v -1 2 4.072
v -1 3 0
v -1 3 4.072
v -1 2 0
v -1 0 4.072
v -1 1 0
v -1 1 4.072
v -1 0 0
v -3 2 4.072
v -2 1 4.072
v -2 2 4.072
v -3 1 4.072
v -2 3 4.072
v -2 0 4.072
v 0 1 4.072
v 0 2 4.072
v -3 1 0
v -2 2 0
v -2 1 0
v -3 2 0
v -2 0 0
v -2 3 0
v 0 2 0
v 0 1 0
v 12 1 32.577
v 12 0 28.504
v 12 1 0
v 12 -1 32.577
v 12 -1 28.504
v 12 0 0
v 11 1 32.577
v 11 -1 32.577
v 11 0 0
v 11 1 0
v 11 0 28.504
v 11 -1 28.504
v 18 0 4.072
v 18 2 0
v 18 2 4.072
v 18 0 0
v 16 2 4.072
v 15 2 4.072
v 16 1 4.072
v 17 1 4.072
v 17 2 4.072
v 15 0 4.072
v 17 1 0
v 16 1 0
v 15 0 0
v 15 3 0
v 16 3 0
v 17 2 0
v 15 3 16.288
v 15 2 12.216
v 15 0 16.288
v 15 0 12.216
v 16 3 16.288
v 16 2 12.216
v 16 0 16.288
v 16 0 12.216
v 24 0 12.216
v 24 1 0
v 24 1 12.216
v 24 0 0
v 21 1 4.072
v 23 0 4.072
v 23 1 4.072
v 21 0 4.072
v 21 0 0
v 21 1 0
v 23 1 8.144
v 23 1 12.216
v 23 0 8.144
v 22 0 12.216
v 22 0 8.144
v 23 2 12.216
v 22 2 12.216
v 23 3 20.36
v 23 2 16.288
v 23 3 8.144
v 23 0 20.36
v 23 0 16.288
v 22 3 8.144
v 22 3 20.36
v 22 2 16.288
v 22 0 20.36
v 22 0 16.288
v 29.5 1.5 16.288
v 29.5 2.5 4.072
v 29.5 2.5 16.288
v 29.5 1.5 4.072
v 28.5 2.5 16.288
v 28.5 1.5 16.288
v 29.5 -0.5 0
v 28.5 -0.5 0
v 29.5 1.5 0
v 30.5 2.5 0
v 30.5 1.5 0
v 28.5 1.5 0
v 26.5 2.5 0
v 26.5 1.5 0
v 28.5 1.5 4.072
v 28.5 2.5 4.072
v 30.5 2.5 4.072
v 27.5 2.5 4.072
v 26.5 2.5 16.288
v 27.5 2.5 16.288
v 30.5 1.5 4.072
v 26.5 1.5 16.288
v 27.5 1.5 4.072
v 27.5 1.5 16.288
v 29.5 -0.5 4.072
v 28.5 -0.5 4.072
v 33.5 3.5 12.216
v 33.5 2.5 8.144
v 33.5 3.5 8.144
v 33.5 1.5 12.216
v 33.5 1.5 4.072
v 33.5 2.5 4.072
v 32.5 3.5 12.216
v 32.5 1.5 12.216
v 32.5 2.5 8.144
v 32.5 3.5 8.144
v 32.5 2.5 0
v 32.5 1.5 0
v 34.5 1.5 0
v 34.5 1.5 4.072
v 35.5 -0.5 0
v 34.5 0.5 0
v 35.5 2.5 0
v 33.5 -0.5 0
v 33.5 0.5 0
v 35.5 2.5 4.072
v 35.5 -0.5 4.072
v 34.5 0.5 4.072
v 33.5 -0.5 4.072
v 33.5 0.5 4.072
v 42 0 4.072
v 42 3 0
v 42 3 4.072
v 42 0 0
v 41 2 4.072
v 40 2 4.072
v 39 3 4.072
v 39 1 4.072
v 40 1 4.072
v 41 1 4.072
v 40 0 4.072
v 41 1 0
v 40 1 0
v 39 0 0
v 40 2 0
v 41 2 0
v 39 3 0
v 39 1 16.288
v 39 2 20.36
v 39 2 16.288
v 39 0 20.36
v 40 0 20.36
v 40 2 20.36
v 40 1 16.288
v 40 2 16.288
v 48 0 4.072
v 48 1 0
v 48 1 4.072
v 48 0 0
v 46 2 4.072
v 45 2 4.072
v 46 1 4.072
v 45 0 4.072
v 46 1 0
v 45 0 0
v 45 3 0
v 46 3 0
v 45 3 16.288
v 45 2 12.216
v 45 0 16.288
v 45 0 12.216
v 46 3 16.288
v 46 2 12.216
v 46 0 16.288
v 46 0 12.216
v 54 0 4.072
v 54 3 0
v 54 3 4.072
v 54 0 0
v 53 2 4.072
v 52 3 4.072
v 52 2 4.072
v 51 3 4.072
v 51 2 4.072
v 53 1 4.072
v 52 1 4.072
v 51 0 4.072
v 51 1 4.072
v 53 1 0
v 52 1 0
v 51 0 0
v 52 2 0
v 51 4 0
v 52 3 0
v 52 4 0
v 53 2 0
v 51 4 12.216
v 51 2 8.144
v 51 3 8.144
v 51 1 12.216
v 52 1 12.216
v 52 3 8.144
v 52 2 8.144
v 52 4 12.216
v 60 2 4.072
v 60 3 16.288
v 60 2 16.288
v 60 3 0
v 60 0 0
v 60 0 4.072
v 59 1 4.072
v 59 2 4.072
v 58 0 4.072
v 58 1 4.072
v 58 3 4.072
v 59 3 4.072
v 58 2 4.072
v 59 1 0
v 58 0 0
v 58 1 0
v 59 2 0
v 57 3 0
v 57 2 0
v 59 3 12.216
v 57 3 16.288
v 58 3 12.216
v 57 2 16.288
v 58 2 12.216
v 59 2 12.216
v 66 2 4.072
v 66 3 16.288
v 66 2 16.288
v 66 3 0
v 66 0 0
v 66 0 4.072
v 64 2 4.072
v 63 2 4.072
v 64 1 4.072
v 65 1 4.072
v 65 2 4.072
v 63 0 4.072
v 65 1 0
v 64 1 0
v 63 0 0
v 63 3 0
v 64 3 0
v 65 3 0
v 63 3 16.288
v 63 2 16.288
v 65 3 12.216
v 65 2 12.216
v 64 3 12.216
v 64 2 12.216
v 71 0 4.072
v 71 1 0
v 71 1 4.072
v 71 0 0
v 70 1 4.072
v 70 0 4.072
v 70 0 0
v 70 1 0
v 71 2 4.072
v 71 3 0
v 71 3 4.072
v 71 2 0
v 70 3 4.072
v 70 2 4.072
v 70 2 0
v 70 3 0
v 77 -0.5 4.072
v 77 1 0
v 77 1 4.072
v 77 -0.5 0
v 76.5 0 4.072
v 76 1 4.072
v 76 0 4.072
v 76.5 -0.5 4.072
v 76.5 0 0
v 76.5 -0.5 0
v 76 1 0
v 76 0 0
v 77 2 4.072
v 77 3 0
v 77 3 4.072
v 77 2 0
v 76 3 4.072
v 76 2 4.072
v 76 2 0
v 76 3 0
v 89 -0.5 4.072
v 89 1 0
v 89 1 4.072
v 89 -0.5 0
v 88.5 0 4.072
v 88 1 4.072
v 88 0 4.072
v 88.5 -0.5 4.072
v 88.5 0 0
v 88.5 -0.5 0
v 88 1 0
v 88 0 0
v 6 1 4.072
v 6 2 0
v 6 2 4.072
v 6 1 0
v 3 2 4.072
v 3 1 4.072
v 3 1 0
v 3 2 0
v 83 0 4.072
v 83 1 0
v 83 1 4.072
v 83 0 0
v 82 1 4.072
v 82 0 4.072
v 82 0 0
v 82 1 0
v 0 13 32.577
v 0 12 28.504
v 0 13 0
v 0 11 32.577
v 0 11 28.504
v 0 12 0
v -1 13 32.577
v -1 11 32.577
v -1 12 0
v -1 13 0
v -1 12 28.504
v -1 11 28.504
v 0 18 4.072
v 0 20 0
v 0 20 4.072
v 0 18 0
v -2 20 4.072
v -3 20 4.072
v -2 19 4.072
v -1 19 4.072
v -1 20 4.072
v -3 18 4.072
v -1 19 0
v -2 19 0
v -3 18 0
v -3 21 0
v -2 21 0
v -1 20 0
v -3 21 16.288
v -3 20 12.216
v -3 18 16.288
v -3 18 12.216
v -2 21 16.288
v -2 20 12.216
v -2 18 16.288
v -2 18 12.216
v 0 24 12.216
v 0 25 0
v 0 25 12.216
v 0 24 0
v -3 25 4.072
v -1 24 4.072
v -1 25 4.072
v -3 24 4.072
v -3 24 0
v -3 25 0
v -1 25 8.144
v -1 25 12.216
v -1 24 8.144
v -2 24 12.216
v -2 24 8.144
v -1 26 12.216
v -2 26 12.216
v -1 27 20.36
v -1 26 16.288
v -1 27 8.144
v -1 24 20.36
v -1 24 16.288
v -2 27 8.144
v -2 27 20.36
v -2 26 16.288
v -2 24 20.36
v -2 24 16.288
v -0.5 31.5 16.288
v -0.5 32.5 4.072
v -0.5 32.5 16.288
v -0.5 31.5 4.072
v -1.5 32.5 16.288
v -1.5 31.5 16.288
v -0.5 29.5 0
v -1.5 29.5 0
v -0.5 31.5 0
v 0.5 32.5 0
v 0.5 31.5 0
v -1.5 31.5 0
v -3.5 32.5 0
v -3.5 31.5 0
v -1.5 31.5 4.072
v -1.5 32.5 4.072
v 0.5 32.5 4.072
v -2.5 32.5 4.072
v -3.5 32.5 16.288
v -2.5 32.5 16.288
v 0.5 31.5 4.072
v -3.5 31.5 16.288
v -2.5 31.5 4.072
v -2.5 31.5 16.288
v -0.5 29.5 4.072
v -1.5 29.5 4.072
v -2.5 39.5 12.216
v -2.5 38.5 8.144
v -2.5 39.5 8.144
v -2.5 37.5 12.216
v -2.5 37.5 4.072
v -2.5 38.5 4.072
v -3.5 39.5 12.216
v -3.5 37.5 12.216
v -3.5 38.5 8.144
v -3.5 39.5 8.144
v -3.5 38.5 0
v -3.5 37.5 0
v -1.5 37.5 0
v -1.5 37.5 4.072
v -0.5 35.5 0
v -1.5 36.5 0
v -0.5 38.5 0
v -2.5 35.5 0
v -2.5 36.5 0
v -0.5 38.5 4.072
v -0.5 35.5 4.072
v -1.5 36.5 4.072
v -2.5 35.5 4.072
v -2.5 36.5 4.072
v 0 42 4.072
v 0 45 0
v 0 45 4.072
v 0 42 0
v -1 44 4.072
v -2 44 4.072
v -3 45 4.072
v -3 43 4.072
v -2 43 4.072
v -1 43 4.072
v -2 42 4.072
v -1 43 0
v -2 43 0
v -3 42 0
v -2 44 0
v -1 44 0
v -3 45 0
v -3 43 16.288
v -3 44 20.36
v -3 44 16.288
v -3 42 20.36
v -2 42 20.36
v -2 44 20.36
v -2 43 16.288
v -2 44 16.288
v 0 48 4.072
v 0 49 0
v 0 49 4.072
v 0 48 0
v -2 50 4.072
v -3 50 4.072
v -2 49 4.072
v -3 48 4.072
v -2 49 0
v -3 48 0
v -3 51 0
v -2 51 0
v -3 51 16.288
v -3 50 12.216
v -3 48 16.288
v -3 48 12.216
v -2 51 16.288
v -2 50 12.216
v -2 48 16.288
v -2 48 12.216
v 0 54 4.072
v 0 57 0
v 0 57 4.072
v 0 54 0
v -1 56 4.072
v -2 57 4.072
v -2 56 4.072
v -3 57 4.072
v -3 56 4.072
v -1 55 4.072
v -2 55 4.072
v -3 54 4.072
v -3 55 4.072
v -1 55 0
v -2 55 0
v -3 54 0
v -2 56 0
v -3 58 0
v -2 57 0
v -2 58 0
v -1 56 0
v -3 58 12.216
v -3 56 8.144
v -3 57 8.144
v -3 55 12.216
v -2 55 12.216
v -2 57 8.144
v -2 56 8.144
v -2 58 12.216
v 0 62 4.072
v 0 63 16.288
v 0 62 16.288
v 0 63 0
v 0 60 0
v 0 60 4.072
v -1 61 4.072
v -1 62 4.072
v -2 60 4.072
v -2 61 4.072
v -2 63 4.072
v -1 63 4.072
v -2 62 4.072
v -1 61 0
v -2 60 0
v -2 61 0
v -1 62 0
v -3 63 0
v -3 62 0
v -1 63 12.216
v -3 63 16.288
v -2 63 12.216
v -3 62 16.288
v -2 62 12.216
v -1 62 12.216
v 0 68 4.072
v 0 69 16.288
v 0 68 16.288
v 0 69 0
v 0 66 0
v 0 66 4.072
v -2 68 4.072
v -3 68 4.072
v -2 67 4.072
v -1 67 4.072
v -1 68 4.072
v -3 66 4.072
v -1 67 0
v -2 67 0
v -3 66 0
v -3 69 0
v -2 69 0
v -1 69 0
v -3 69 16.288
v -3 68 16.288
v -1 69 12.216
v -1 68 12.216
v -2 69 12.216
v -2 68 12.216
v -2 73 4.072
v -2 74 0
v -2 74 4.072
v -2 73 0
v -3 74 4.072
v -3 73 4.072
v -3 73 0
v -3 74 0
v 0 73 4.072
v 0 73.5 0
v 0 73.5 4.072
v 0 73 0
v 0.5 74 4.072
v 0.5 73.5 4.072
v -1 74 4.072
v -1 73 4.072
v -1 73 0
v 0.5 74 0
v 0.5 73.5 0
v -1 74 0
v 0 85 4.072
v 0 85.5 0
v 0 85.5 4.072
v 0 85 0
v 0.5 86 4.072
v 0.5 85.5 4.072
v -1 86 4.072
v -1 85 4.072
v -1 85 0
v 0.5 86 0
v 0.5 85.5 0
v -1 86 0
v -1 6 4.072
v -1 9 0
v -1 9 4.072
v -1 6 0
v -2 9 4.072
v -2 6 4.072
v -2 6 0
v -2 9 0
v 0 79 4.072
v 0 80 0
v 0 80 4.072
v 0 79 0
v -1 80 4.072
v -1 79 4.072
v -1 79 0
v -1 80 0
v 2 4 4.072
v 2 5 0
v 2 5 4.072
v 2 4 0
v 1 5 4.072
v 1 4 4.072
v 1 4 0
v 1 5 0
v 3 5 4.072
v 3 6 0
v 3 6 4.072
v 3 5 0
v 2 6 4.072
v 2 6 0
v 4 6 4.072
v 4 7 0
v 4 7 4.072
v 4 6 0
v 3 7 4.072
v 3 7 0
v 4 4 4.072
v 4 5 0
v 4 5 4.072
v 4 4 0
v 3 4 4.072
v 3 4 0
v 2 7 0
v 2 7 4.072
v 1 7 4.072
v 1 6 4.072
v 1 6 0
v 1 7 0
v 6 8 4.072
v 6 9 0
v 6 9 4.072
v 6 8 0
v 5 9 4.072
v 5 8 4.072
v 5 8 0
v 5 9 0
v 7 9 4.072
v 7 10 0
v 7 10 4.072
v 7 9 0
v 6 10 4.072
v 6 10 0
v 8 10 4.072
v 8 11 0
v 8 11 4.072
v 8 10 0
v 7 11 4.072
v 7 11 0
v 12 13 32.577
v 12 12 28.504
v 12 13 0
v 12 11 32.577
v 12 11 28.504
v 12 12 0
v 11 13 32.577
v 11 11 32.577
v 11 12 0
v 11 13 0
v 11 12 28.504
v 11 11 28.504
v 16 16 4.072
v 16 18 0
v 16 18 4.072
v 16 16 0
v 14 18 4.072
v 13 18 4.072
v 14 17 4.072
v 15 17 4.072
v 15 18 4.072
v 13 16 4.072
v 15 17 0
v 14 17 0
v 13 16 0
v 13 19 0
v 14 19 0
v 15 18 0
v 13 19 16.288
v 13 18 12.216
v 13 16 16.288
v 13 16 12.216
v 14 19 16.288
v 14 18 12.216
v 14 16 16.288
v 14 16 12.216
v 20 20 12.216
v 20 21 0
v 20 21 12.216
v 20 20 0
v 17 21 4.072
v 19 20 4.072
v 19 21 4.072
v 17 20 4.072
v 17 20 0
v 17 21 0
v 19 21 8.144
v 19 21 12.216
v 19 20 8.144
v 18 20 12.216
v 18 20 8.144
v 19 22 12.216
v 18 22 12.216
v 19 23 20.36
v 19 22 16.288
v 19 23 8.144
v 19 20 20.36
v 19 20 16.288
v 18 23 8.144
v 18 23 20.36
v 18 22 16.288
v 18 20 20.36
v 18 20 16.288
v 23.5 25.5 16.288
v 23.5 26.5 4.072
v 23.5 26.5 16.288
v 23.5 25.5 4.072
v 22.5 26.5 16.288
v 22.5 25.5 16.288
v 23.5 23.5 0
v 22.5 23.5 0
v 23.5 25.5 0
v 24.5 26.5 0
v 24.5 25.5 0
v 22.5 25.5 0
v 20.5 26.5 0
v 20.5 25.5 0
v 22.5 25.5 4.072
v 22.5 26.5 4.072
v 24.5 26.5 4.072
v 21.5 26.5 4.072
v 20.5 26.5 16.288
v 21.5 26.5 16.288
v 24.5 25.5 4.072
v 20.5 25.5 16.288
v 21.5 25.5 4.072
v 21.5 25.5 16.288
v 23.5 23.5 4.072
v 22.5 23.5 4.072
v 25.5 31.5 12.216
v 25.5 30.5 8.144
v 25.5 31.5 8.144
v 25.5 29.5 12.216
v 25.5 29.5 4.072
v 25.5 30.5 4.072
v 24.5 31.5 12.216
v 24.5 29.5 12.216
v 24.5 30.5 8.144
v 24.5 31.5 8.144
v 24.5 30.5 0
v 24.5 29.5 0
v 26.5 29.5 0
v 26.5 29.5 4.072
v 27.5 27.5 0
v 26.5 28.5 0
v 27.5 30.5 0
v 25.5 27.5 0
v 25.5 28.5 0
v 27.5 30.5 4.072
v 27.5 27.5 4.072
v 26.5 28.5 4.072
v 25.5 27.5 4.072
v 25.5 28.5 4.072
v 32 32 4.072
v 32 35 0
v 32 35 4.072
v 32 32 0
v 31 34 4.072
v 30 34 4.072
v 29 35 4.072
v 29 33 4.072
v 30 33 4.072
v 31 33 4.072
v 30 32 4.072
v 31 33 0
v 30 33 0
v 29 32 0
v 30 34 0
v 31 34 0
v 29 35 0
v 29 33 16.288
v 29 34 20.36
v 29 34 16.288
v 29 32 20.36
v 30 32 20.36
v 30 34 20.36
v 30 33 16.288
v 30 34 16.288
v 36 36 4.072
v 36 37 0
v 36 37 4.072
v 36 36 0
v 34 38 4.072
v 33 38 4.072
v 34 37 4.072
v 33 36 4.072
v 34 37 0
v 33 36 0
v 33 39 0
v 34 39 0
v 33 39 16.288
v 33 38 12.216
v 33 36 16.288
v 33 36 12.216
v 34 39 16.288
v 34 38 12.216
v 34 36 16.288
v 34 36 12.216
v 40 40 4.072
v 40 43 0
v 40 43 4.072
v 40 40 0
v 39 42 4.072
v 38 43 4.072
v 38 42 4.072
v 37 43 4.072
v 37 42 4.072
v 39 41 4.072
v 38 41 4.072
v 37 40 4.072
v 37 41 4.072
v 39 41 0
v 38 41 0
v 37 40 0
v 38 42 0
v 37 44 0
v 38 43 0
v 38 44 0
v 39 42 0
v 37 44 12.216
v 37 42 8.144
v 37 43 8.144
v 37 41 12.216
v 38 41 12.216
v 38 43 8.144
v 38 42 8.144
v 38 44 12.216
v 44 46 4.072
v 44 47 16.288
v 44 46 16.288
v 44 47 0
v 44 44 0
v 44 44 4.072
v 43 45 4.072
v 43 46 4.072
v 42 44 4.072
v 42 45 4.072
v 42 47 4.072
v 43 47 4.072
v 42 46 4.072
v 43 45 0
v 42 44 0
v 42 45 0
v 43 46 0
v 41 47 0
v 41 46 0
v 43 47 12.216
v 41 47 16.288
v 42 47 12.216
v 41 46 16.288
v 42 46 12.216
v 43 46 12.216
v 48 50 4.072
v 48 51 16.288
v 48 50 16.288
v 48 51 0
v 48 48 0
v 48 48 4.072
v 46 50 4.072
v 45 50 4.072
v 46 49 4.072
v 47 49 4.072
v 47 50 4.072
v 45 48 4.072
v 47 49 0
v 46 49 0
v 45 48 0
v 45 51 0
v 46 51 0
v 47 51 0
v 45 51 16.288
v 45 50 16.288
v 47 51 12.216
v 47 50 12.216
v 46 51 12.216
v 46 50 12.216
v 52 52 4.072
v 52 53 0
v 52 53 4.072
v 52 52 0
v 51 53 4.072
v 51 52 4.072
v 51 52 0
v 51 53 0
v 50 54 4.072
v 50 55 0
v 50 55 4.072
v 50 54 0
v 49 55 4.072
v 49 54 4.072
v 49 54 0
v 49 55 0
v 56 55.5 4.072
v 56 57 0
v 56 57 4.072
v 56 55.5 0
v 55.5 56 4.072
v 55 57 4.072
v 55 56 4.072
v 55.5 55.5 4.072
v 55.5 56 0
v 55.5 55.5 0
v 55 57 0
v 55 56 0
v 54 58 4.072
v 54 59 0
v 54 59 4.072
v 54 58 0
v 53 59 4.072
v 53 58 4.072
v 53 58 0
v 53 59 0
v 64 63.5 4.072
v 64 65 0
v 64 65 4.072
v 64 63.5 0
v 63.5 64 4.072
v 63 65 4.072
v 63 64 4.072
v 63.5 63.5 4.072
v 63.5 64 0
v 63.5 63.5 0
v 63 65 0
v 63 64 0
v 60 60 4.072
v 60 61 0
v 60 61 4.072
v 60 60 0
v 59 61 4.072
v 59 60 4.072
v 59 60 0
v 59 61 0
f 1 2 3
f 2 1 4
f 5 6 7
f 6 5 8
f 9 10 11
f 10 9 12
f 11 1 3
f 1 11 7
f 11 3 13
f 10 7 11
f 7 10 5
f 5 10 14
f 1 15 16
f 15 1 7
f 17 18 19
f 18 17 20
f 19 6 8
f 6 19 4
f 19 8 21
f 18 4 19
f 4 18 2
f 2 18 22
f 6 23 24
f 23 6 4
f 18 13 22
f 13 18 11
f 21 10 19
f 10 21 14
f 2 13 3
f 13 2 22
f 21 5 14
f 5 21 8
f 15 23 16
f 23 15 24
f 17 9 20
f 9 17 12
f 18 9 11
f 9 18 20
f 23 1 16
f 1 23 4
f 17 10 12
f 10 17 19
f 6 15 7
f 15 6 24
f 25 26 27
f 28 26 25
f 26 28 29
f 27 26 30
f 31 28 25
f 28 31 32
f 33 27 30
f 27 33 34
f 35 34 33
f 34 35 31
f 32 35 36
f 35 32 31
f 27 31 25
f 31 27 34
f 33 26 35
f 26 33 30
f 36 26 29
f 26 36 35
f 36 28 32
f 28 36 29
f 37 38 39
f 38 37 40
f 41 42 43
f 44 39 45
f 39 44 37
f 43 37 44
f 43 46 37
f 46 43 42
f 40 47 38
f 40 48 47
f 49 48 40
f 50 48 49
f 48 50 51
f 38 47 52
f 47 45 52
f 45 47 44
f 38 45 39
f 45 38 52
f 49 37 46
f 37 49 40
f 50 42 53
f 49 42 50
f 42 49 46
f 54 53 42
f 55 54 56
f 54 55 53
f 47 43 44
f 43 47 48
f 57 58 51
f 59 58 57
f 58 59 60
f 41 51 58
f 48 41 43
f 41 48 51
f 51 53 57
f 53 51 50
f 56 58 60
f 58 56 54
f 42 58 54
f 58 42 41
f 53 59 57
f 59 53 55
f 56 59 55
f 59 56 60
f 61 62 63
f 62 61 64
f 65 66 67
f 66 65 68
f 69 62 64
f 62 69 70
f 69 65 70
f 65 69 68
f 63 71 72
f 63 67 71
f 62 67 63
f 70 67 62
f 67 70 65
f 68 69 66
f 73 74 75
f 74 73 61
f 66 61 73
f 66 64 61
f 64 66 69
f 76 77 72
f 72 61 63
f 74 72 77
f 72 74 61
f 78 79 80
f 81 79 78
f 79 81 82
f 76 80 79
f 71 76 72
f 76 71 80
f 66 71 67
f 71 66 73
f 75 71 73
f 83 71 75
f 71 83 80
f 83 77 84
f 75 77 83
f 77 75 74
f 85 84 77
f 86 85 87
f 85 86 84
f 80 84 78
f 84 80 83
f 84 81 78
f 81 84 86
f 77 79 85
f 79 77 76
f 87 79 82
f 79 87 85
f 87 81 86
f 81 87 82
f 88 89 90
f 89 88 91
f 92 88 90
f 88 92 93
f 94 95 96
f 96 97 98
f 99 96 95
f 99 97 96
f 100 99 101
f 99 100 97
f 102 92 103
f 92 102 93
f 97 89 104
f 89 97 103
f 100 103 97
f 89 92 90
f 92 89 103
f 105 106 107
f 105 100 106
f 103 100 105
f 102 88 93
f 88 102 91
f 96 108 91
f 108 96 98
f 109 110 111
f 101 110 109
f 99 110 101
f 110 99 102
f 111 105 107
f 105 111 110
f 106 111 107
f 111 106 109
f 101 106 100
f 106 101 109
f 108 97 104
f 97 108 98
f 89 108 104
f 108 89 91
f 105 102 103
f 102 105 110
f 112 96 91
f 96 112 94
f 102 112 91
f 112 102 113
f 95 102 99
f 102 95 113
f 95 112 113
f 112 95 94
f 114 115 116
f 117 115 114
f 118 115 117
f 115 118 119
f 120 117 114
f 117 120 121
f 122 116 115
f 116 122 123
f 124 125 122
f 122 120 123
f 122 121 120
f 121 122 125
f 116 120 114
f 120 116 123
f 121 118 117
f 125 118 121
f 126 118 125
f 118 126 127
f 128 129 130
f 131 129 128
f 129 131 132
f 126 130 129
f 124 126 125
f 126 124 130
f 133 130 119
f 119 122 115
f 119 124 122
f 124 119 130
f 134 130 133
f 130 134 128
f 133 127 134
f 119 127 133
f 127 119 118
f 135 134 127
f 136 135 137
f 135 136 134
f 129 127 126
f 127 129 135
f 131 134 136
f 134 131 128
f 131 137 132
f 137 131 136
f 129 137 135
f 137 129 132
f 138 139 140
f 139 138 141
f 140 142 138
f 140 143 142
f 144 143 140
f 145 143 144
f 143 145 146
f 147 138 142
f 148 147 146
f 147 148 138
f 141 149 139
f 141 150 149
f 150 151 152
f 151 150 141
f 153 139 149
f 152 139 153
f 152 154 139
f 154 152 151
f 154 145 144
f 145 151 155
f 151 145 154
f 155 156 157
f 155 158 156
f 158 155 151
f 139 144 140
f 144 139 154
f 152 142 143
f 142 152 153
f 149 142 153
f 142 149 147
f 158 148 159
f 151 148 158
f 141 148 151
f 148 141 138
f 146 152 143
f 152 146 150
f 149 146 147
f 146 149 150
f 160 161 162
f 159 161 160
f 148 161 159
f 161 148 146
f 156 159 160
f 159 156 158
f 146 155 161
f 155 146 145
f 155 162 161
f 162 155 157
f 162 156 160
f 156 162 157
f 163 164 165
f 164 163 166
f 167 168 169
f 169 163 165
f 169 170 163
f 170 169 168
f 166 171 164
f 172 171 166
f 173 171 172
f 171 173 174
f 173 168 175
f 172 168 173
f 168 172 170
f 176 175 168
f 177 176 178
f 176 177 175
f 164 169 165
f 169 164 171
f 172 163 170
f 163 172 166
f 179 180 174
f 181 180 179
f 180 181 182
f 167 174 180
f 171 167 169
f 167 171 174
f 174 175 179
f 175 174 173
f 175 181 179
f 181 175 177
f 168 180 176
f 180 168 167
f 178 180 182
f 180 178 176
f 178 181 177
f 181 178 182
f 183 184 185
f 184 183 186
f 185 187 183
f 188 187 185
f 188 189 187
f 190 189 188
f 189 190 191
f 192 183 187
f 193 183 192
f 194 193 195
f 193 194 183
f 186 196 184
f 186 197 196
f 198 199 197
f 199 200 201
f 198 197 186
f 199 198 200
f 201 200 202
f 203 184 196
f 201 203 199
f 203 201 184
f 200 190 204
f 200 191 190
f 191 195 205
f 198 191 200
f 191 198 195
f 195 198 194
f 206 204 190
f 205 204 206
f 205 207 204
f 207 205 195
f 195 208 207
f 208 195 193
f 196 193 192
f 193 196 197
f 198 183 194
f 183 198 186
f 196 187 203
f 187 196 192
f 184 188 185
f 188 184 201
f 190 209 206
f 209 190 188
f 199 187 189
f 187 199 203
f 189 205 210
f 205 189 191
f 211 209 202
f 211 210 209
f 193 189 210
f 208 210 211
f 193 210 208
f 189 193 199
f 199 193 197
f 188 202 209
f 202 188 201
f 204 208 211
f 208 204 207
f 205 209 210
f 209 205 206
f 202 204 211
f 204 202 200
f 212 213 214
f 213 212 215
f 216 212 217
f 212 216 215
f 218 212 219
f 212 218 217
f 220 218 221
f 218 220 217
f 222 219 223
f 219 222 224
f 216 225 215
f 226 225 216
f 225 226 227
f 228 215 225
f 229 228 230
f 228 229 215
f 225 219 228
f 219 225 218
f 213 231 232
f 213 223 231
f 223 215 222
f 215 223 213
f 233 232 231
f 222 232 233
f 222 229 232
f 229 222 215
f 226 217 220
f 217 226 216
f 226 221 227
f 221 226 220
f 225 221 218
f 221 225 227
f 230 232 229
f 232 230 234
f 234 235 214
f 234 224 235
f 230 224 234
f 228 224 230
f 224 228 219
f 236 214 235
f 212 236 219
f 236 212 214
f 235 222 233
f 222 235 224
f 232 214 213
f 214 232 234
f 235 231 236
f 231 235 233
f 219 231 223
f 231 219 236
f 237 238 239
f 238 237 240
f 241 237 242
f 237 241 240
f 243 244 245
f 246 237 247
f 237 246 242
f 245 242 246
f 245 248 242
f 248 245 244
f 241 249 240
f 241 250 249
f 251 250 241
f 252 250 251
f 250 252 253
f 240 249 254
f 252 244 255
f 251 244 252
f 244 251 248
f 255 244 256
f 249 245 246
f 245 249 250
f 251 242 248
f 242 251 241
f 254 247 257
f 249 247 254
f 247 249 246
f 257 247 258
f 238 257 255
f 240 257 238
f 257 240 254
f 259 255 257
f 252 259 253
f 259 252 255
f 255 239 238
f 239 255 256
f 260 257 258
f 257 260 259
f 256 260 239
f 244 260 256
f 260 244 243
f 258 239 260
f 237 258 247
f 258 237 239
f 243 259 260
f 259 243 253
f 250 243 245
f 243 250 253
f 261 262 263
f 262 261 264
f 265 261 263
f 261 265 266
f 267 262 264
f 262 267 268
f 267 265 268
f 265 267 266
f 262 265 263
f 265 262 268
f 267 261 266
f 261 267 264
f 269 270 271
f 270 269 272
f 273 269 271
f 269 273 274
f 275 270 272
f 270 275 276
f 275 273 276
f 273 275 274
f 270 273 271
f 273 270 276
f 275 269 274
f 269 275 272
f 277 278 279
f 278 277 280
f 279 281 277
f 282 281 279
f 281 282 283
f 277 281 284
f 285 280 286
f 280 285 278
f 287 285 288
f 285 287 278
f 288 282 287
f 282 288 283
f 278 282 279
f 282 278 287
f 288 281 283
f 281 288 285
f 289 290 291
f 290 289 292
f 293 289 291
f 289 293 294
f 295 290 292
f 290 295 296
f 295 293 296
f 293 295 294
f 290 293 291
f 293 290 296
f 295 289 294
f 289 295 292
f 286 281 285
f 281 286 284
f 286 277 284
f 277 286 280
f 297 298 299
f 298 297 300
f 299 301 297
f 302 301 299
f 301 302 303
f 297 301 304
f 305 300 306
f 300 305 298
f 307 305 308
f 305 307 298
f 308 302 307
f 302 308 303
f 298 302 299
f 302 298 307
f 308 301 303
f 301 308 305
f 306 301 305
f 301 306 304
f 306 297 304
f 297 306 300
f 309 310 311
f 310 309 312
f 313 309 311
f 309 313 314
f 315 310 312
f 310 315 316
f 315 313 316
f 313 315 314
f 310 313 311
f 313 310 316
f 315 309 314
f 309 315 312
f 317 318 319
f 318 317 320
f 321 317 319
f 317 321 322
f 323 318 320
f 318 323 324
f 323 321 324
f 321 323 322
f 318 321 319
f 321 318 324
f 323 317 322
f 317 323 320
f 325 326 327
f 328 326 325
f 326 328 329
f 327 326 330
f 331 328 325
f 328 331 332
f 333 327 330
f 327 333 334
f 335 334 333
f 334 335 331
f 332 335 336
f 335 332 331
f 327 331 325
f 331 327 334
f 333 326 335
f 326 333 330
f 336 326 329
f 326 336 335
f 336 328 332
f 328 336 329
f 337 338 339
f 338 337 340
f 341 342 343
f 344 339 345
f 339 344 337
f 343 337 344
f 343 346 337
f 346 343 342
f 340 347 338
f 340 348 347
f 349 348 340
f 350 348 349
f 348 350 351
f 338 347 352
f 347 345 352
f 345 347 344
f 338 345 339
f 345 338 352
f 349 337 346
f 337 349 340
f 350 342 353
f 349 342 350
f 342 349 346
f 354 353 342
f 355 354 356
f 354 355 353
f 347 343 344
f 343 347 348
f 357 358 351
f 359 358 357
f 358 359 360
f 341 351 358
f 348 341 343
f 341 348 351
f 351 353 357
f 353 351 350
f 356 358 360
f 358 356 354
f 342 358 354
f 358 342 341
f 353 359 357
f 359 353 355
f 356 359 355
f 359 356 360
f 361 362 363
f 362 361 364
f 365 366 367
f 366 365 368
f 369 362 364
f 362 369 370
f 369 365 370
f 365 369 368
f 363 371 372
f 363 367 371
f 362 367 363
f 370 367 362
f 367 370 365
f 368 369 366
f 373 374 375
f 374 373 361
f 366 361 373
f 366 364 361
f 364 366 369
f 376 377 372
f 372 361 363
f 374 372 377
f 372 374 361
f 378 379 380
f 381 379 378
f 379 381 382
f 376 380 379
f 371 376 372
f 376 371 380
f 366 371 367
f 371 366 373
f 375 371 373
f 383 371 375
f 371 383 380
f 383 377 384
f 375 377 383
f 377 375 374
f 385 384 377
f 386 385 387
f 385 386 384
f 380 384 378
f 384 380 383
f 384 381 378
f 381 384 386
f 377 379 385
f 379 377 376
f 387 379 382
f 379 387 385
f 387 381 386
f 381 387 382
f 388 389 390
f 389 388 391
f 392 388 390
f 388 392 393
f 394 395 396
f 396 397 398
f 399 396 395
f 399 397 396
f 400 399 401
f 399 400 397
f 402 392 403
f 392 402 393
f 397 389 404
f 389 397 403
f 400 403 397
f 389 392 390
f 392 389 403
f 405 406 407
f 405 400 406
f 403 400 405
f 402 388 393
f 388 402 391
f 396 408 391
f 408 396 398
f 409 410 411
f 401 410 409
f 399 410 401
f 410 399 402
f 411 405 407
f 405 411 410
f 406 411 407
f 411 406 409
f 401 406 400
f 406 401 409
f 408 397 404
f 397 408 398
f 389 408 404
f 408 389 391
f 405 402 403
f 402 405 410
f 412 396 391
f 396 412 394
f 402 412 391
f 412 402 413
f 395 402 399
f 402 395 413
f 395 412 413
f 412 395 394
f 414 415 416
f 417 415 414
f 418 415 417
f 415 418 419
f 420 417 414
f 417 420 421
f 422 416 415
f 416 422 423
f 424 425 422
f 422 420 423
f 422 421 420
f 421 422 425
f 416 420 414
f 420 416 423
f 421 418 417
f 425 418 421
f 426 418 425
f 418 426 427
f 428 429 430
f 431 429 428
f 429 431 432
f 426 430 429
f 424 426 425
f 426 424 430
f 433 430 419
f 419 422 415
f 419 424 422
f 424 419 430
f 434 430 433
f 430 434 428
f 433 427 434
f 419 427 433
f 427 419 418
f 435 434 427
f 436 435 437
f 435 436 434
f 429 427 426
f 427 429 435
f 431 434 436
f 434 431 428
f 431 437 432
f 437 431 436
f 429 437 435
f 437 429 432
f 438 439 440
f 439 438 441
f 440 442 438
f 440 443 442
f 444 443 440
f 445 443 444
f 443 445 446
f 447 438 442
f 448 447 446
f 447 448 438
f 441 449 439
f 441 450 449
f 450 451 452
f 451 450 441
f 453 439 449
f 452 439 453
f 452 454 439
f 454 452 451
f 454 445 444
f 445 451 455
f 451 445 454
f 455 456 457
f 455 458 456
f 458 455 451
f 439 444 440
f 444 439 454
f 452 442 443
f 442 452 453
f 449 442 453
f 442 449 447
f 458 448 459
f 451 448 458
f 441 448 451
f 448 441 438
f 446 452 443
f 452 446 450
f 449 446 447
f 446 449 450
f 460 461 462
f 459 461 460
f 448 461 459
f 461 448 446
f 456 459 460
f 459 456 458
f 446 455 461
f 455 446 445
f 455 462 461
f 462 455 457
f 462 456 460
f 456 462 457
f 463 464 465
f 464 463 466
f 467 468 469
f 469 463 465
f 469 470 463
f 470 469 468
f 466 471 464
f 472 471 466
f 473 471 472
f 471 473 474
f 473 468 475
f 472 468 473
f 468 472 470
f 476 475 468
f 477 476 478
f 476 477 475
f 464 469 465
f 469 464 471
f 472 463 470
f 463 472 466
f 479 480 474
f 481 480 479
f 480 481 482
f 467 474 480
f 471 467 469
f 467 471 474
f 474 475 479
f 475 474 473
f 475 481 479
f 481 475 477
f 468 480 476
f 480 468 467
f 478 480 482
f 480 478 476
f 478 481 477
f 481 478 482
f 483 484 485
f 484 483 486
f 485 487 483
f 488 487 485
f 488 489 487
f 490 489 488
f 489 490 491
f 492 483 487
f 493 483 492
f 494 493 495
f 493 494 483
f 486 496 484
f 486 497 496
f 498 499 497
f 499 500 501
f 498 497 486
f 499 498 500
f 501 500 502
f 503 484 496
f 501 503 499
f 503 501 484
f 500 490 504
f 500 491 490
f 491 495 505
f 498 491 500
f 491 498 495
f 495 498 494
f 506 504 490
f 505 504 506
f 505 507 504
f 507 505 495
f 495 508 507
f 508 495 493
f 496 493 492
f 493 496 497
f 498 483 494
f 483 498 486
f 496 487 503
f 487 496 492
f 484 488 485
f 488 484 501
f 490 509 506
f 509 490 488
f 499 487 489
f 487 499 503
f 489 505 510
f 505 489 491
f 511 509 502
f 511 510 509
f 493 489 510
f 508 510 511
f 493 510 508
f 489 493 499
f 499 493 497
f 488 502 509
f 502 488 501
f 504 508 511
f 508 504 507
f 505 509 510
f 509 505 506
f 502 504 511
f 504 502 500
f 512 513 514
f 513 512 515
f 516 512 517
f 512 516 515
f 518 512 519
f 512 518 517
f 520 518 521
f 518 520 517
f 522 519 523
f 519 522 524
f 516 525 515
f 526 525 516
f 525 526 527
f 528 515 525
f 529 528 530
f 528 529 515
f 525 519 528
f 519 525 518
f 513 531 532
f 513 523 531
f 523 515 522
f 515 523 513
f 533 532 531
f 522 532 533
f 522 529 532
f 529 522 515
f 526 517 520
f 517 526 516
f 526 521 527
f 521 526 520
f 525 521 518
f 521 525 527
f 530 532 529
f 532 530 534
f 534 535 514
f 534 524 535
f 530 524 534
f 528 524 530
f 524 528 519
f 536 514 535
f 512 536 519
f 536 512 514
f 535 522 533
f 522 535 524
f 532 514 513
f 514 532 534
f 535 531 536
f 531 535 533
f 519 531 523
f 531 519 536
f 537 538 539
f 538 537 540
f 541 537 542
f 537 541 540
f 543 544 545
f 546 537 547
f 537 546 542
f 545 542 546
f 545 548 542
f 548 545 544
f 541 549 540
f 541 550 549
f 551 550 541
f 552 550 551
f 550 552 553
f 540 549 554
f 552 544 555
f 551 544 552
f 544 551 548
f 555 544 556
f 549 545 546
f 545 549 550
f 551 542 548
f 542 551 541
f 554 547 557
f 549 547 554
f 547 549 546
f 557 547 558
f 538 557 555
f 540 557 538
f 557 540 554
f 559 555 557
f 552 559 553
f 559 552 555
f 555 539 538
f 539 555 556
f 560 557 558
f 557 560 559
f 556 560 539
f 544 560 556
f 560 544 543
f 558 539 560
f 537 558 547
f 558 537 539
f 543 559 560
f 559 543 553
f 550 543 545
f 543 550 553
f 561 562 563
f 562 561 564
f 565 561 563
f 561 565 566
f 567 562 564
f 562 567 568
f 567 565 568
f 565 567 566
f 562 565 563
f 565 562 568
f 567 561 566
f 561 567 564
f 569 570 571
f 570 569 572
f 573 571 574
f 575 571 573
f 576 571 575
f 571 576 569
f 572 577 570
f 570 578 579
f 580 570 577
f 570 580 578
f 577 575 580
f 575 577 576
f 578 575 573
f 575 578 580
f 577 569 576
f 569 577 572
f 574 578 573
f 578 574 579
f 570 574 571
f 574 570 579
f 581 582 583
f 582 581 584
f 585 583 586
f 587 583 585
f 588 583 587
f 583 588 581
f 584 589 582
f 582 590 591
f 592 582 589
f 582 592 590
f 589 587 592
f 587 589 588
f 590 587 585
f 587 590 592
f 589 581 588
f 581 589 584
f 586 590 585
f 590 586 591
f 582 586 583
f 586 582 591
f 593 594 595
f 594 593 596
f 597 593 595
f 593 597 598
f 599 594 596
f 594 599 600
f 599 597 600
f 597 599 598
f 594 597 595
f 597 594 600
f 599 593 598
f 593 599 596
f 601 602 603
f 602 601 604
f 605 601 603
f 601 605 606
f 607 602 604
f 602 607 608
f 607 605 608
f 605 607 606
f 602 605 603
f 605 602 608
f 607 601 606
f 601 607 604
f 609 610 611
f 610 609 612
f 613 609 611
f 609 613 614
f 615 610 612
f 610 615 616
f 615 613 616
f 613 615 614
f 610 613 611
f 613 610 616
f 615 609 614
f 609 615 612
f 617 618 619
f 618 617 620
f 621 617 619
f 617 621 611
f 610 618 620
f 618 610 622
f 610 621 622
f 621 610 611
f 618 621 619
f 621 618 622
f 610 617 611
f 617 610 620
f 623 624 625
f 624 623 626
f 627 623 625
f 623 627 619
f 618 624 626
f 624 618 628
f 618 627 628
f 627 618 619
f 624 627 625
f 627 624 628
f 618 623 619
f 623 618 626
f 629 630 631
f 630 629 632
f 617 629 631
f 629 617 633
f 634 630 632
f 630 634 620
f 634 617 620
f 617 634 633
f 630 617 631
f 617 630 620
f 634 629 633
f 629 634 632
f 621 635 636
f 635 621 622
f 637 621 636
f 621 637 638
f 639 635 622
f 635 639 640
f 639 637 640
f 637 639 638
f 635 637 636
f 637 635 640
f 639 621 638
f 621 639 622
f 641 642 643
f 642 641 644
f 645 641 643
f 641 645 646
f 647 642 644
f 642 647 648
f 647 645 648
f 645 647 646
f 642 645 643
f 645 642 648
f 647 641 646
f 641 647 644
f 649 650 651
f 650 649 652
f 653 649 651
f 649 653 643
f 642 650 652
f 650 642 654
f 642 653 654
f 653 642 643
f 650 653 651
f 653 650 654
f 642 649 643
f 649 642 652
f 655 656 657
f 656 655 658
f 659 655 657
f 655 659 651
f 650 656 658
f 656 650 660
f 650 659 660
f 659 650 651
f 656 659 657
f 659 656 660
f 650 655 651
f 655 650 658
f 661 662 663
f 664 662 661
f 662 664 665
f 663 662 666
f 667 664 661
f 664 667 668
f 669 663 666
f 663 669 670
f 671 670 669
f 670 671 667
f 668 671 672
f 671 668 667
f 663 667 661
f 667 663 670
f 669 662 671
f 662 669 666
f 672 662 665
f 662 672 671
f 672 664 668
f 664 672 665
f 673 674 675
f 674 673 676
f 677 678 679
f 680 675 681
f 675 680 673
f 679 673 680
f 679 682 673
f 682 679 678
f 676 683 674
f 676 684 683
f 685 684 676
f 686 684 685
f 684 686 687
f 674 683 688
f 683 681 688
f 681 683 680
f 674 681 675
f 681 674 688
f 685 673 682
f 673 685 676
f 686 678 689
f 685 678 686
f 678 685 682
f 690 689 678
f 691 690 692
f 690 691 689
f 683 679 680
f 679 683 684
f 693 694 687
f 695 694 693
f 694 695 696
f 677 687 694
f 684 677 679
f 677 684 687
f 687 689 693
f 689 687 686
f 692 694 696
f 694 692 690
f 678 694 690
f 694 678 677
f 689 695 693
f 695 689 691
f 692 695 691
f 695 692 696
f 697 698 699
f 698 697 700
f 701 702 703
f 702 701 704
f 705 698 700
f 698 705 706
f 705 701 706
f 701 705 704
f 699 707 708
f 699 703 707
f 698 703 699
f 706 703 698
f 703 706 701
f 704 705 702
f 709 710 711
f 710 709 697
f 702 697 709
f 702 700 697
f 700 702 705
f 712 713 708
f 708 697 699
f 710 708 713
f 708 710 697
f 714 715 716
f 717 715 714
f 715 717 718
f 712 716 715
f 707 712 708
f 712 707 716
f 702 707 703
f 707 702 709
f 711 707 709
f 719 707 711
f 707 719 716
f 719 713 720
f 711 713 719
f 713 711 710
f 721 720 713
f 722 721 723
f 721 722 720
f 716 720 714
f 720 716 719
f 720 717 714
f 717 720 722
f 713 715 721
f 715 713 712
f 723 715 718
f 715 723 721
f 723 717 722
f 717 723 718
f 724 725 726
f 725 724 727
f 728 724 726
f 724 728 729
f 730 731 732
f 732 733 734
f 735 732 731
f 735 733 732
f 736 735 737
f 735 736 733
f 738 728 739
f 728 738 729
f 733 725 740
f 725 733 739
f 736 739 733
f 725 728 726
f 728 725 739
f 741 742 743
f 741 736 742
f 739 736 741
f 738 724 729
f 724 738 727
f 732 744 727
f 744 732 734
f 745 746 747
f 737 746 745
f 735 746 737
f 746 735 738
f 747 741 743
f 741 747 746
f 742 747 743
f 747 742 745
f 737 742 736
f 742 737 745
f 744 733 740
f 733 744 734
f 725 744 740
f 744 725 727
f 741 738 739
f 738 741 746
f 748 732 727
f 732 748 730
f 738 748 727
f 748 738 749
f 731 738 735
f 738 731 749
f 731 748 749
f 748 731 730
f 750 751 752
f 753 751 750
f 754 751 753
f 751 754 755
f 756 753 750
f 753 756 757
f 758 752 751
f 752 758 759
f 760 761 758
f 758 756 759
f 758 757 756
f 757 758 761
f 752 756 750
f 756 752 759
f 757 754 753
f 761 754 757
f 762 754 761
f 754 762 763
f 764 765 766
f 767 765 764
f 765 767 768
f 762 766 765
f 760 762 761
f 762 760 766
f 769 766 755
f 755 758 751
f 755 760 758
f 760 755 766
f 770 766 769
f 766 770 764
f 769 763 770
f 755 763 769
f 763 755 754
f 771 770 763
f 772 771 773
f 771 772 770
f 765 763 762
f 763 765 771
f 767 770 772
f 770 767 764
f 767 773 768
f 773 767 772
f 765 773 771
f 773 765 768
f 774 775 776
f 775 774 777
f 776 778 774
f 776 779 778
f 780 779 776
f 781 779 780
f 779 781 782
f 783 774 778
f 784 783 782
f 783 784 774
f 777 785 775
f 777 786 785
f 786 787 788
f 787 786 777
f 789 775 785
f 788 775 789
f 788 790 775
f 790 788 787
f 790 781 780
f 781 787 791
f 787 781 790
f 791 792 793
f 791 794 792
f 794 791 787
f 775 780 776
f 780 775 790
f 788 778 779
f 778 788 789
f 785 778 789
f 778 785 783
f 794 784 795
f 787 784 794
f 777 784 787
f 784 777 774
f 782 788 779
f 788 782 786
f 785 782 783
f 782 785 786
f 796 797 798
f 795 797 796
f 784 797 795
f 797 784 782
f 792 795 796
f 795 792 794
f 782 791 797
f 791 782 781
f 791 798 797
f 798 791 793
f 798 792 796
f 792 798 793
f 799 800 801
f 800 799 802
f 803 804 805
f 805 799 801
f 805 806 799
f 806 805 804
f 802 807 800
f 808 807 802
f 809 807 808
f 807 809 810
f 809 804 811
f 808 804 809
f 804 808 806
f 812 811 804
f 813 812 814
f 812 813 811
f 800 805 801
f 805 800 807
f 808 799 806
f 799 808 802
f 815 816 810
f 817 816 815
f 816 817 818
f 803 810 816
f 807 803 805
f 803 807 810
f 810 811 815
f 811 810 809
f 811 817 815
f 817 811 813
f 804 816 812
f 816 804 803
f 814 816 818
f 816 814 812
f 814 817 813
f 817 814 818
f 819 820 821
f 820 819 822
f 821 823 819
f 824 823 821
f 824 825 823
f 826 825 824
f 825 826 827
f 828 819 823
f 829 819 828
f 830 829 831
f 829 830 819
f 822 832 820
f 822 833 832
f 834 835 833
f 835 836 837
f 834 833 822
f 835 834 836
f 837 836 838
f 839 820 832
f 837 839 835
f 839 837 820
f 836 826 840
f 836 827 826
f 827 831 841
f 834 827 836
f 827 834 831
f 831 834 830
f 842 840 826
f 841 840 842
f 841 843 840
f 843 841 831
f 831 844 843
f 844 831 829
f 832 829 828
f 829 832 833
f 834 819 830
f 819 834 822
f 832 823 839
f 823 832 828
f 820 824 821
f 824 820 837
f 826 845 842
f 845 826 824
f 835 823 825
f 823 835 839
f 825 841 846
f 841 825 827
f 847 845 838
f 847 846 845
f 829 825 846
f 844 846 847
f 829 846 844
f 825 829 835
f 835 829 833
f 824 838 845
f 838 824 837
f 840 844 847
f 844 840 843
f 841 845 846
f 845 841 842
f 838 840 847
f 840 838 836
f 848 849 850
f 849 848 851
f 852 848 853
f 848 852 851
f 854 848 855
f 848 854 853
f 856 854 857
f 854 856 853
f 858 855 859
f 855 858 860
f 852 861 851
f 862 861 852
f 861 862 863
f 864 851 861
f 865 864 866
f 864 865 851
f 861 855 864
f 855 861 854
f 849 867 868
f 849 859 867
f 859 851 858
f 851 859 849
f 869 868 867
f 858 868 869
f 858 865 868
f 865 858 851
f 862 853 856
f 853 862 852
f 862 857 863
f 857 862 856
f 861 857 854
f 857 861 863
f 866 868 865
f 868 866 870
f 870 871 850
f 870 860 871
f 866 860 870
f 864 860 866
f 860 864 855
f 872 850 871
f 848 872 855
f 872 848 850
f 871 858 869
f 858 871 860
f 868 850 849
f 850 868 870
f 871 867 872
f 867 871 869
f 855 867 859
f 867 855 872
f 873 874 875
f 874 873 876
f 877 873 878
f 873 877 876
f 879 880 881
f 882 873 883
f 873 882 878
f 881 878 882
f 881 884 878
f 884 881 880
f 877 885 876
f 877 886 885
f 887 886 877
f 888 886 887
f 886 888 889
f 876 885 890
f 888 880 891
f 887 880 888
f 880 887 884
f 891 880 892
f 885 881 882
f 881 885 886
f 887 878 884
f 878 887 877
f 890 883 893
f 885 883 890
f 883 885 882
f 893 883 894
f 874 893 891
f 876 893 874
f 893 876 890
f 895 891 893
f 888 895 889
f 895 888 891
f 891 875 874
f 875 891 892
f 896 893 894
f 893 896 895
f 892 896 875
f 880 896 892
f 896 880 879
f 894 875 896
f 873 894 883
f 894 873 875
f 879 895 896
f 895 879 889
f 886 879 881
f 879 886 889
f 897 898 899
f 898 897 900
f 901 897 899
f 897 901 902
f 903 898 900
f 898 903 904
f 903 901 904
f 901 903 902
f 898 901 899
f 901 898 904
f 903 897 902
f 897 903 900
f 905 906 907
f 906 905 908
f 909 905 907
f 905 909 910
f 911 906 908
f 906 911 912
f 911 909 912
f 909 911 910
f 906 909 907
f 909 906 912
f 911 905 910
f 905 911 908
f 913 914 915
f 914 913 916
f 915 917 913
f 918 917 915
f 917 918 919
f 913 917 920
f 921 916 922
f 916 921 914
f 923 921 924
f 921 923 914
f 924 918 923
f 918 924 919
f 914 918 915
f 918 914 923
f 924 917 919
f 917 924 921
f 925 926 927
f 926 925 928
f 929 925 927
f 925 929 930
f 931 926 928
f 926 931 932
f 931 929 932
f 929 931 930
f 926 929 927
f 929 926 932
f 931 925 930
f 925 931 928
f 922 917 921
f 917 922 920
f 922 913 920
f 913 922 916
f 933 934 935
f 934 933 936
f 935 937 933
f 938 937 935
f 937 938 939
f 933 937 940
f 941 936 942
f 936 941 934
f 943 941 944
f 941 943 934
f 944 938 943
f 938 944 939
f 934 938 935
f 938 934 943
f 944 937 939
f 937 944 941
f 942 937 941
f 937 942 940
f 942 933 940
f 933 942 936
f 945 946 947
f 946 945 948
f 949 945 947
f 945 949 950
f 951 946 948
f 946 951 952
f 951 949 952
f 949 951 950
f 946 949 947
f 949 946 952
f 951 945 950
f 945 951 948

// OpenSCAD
/*
(c) 2020 Creative Common 4.0 Attribution (BY)
https://creativecommons.org/licenses/by/4.0/

!!! For best result set View -> Orthogonal in OpenSCAD !!!

Draw all possible symbols in three directions.

OpenSCAD 2019.05
https://github.com/adorable-monkey/tech_estetika_numbers/
*/

include <tech_estetika_numbers.scad>
$angle=10;

// Camera configuration
$vpr=[$angle,0,45];

// Text to print
numbers("+-1234567890:;.,","down",$x_axis_space,$y_axis_space,$edge,$vert_edge_k);
numbers("+-1234567890;.,","up",$x_axis_space,$y_axis_space,$edge,$vert_edge_k);
numbers(" +-1234567890:;.,","straight",$x_axis_space,$y_axis_space,$edge,$vert_edge_k);
